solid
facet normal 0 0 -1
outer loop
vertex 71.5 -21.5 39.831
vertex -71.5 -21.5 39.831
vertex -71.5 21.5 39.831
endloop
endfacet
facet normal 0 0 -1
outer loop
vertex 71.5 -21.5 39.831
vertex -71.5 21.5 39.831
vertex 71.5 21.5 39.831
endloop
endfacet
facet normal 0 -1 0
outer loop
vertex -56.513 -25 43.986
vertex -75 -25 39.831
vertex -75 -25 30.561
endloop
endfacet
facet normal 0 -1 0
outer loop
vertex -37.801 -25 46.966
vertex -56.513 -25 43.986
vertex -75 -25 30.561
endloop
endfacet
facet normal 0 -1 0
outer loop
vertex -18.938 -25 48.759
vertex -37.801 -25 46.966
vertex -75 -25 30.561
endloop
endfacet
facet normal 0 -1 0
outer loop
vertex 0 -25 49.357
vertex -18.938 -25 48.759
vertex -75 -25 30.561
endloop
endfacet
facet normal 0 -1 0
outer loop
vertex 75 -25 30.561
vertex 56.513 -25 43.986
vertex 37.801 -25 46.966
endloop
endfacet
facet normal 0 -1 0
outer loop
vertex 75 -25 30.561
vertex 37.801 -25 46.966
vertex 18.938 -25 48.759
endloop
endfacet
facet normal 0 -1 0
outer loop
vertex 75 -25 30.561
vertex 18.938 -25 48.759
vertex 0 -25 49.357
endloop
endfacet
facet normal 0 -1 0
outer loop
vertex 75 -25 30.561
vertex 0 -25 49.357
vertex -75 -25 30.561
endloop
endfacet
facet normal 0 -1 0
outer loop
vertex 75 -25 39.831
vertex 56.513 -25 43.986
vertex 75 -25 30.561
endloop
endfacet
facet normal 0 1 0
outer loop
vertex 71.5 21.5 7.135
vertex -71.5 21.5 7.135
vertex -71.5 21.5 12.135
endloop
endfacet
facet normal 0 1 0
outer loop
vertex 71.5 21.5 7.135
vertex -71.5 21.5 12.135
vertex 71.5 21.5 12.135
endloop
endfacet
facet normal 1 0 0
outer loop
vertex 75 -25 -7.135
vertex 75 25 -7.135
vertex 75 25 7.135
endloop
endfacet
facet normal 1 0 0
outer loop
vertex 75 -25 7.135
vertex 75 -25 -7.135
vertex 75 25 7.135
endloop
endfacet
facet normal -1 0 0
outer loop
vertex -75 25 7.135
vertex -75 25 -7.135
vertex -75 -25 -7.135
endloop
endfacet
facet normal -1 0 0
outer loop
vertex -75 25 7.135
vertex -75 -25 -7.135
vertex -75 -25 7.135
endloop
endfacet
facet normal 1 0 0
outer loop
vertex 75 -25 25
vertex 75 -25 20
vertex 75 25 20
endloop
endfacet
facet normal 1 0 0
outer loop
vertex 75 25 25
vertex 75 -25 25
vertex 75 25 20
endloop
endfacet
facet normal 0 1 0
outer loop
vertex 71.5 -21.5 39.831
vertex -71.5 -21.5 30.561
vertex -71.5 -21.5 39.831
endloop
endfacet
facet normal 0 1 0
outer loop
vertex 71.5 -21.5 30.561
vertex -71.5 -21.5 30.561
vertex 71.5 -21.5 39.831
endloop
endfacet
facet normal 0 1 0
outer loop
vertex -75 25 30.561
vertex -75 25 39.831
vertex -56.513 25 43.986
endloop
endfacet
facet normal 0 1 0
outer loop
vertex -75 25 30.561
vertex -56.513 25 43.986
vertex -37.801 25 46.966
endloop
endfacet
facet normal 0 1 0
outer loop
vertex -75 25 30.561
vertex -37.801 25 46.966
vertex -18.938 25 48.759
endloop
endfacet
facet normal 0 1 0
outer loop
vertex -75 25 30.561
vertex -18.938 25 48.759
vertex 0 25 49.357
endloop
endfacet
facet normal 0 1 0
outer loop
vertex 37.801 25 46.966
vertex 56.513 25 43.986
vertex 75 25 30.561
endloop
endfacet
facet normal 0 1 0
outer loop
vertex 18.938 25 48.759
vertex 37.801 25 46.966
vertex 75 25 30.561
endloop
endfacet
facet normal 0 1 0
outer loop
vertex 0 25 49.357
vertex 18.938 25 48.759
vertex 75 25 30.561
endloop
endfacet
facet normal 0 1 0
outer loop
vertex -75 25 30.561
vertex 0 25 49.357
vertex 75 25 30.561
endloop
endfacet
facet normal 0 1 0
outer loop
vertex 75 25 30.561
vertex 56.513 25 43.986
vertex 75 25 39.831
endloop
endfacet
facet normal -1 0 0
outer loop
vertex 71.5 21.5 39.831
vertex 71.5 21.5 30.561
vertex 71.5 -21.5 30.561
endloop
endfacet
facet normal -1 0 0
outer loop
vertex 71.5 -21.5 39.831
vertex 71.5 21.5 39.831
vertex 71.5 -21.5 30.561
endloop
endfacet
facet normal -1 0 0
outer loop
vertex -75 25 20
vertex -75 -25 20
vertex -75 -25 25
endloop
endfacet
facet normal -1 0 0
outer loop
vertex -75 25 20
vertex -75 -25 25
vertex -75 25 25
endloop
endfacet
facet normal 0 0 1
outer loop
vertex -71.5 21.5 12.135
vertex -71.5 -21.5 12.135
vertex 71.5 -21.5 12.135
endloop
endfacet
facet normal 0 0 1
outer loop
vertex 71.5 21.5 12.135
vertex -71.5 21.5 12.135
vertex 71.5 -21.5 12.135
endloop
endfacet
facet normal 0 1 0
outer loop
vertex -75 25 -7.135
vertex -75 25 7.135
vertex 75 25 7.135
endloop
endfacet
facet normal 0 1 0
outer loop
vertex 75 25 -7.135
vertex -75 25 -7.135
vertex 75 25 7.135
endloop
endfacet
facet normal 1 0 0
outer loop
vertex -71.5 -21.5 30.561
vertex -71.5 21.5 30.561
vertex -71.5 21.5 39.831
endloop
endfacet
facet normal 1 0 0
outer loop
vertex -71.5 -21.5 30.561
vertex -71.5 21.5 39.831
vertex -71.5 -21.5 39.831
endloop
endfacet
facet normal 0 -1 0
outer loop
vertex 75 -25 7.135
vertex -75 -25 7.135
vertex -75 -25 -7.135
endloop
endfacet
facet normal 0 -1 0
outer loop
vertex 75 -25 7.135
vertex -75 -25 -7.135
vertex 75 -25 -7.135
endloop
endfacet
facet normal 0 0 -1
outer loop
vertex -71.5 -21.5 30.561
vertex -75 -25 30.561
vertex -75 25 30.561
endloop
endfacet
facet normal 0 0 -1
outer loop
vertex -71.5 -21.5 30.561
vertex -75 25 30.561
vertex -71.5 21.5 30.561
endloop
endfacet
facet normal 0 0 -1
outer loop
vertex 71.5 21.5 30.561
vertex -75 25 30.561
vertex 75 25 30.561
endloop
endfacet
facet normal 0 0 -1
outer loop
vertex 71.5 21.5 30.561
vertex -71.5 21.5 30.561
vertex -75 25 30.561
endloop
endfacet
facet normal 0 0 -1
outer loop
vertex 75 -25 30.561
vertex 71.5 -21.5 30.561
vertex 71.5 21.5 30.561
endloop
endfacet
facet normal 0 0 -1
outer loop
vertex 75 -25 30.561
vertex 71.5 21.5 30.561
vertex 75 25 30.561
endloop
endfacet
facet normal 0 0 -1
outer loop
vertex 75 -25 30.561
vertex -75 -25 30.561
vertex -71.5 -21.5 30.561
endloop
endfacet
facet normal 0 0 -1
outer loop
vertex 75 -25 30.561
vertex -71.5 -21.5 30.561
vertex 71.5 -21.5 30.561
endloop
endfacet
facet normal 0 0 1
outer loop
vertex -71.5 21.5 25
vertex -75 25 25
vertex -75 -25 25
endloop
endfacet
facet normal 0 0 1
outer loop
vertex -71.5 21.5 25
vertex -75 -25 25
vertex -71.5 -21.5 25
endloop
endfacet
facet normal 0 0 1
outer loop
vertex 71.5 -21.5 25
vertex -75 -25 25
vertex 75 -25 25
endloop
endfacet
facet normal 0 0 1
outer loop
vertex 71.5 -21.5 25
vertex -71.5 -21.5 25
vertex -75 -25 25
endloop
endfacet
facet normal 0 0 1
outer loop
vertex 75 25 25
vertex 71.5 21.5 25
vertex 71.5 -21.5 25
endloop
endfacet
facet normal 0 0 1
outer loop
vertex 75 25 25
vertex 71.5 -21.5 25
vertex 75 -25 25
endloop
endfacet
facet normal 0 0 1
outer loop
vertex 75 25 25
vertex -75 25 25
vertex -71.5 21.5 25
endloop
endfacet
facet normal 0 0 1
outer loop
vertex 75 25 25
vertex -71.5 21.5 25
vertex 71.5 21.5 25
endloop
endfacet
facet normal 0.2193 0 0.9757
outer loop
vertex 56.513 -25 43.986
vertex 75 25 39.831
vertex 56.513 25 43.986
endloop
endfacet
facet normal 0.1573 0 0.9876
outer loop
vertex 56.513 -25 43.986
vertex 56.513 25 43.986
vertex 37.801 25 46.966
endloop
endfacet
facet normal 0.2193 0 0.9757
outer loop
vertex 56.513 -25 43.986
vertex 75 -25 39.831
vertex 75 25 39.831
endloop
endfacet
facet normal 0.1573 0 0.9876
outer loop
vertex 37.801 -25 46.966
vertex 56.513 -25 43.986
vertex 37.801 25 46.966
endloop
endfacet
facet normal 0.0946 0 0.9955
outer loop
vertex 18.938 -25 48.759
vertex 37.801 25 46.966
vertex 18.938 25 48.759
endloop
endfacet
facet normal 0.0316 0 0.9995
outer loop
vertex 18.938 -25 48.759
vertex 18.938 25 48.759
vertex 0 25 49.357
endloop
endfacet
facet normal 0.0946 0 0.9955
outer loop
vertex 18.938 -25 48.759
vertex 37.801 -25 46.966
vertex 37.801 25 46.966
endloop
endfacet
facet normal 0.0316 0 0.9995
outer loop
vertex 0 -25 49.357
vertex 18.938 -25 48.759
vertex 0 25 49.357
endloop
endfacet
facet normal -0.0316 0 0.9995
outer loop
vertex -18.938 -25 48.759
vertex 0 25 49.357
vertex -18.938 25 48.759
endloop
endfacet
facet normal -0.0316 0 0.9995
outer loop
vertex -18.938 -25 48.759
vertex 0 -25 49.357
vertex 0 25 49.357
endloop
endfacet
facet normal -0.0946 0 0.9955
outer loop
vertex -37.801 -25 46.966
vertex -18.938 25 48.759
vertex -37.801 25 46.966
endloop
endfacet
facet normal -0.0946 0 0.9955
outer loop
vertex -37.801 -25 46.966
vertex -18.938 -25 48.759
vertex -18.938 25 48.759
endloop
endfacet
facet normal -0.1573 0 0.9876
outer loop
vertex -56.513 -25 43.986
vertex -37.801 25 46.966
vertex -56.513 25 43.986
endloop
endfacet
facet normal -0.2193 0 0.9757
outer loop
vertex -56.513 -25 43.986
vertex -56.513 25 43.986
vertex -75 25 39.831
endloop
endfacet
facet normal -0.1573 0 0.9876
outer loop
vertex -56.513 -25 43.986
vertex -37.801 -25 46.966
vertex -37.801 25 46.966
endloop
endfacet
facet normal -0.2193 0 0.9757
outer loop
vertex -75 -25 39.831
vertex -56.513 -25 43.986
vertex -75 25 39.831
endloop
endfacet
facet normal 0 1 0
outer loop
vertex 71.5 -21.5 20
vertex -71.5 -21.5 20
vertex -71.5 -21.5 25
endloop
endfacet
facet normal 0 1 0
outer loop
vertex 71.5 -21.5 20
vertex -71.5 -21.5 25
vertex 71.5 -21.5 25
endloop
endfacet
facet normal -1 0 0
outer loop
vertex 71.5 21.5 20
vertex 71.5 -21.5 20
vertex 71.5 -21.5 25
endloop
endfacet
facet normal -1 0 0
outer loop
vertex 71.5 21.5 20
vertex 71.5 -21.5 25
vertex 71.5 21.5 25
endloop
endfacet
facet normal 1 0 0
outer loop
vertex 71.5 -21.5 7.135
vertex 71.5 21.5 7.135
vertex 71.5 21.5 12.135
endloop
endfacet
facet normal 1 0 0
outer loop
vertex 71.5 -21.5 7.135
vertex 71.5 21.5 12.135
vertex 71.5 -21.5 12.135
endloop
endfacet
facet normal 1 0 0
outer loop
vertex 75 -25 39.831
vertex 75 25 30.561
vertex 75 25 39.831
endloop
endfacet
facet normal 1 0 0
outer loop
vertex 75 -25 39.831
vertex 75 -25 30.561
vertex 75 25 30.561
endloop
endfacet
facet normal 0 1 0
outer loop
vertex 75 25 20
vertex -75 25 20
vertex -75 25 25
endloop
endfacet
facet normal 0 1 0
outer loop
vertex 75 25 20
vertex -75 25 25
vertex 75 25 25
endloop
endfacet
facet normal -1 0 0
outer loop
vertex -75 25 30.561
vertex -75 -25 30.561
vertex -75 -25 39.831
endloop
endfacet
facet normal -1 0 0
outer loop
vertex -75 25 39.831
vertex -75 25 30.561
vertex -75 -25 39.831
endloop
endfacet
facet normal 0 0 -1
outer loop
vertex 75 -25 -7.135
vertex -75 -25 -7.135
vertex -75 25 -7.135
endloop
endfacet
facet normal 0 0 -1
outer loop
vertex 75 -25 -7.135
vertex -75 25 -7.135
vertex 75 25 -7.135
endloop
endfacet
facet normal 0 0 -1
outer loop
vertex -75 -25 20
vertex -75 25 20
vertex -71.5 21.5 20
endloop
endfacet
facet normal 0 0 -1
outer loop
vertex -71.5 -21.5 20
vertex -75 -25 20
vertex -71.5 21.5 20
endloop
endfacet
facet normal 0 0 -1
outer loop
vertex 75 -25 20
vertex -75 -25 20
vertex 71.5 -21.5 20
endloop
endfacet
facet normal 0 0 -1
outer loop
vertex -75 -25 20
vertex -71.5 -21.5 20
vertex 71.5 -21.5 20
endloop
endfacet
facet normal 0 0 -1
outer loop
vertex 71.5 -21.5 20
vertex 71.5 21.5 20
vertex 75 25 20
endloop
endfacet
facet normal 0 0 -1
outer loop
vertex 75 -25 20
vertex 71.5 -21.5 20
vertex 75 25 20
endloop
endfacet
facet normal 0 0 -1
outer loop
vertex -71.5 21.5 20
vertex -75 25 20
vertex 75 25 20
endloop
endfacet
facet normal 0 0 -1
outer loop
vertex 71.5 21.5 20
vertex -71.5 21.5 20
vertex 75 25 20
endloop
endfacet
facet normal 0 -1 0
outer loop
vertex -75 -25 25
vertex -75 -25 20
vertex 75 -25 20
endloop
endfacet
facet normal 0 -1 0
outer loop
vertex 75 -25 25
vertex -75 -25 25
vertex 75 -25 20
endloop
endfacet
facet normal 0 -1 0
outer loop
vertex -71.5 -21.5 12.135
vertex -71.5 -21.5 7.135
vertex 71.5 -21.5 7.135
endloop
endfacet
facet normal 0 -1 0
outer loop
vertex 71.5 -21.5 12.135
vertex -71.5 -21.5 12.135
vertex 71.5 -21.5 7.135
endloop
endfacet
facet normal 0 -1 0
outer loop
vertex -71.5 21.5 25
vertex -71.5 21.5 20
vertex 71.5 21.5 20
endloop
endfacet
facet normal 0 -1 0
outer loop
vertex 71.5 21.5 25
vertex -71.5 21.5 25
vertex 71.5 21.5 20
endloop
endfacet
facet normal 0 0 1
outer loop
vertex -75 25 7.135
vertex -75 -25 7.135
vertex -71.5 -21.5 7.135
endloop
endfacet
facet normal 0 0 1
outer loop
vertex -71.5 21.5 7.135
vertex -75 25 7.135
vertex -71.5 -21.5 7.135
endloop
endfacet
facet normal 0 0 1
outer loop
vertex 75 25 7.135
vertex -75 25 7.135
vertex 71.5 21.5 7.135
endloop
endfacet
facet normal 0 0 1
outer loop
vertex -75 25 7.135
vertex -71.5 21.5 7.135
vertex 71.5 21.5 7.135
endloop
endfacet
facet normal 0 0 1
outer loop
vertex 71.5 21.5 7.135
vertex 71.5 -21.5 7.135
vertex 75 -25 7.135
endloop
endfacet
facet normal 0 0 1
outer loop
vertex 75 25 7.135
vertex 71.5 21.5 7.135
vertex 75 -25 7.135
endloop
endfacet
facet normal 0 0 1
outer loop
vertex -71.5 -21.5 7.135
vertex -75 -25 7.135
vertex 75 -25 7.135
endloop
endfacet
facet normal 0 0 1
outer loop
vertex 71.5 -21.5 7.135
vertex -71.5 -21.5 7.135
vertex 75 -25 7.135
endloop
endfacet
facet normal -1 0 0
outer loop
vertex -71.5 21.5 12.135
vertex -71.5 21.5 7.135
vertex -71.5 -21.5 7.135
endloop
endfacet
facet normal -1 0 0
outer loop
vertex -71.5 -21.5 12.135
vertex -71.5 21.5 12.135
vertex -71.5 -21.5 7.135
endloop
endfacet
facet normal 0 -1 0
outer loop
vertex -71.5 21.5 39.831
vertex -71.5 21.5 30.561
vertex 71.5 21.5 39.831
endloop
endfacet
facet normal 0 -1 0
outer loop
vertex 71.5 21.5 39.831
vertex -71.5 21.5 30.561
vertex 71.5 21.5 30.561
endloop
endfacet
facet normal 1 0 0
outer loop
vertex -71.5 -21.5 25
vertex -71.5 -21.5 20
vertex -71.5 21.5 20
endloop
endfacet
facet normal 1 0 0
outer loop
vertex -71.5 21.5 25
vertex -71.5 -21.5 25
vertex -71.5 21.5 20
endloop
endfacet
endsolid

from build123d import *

# Parameters (mm, degrees)
F0_W      = 150
F0_H      = 14.27
F1_DEPTH  = 25
F2_DEPTH  = 25
F3_W      = 143
F3_H      = 43
F4_DEPTH  = 19.27
F6_W      = 150
F6_H      = 50
F6_W_2    = 143
F6_H_2    = 43
F7_DEPTH  = 5
F8_W      = 150
F8_H      = 9.27
F9_DEPTH  = 25
F10_DEPTH = 25
F11_W     = 143
F11_H     = 43
F12_DEPTH = 9.27


with BuildPart() as f1:
    # F0 (on Front) → F1 (new body)
    with BuildSketch(Plane.XZ):
        Rectangle(F0_W, F0_H)
    extrude(amount=F1_DEPTH)

    # F2 (add): a face of the model
    f2_faces = [f1.faces().sort_by_distance(p)[0] for p in [
        (0, 0, 0),
    ]]
    extrude(f2_faces, amount=F2_DEPTH)

    # F3 (on face) → F4 (join)
    with BuildSketch(Plane(origin=(0, 0, -7.135), x_dir=(1, 0, 0), z_dir=(0, 0, -1))):
        Rectangle(F3_W, F3_H)
    extrude(amount=-F4_DEPTH)


with BuildPart() as f7:
    # F6 (on offset) → F7 (new body)
    with BuildSketch(Plane.XY.offset(20)):
        Rectangle(F6_W, F6_H)
        Rectangle(F6_W_2, F6_H_2, mode=Mode.SUBTRACT)
    extrude(amount=F7_DEPTH)


with BuildPart() as f9:
    # F8 (on Front) → F9 (new body)
    with BuildSketch(Plane.XZ):
        with BuildLine():
            Line((-75, 39.8310137486), (75, 39.8310137486))
            ThreePointArc((75, 39.8310137486), (0, 49.3572627831), (-75, 39.8310137486))
        make_face()
        with Locations((0, 35.1960137486)):
            Rectangle(F8_W, F8_H)
    extrude(amount=F9_DEPTH)

    # F10 (add): a face of the model
    f10_faces = [f9.faces().sort_by_distance(p)[0] for p in [
        (0, 0, 38.6383136313),
    ]]
    extrude(f10_faces, amount=F10_DEPTH)

    # F11 (on face) → F12 (cut)
    with BuildSketch(Plane(origin=(0, 0, 30.5610137486), x_dir=(1, 0, 0), z_dir=(0, 0, -1))):
        Rectangle(F11_W, F11_H)
    extrude(amount=-F12_DEPTH, mode=Mode.SUBTRACT)


solid = Compound([f1.part, f7.part, f9.part])
